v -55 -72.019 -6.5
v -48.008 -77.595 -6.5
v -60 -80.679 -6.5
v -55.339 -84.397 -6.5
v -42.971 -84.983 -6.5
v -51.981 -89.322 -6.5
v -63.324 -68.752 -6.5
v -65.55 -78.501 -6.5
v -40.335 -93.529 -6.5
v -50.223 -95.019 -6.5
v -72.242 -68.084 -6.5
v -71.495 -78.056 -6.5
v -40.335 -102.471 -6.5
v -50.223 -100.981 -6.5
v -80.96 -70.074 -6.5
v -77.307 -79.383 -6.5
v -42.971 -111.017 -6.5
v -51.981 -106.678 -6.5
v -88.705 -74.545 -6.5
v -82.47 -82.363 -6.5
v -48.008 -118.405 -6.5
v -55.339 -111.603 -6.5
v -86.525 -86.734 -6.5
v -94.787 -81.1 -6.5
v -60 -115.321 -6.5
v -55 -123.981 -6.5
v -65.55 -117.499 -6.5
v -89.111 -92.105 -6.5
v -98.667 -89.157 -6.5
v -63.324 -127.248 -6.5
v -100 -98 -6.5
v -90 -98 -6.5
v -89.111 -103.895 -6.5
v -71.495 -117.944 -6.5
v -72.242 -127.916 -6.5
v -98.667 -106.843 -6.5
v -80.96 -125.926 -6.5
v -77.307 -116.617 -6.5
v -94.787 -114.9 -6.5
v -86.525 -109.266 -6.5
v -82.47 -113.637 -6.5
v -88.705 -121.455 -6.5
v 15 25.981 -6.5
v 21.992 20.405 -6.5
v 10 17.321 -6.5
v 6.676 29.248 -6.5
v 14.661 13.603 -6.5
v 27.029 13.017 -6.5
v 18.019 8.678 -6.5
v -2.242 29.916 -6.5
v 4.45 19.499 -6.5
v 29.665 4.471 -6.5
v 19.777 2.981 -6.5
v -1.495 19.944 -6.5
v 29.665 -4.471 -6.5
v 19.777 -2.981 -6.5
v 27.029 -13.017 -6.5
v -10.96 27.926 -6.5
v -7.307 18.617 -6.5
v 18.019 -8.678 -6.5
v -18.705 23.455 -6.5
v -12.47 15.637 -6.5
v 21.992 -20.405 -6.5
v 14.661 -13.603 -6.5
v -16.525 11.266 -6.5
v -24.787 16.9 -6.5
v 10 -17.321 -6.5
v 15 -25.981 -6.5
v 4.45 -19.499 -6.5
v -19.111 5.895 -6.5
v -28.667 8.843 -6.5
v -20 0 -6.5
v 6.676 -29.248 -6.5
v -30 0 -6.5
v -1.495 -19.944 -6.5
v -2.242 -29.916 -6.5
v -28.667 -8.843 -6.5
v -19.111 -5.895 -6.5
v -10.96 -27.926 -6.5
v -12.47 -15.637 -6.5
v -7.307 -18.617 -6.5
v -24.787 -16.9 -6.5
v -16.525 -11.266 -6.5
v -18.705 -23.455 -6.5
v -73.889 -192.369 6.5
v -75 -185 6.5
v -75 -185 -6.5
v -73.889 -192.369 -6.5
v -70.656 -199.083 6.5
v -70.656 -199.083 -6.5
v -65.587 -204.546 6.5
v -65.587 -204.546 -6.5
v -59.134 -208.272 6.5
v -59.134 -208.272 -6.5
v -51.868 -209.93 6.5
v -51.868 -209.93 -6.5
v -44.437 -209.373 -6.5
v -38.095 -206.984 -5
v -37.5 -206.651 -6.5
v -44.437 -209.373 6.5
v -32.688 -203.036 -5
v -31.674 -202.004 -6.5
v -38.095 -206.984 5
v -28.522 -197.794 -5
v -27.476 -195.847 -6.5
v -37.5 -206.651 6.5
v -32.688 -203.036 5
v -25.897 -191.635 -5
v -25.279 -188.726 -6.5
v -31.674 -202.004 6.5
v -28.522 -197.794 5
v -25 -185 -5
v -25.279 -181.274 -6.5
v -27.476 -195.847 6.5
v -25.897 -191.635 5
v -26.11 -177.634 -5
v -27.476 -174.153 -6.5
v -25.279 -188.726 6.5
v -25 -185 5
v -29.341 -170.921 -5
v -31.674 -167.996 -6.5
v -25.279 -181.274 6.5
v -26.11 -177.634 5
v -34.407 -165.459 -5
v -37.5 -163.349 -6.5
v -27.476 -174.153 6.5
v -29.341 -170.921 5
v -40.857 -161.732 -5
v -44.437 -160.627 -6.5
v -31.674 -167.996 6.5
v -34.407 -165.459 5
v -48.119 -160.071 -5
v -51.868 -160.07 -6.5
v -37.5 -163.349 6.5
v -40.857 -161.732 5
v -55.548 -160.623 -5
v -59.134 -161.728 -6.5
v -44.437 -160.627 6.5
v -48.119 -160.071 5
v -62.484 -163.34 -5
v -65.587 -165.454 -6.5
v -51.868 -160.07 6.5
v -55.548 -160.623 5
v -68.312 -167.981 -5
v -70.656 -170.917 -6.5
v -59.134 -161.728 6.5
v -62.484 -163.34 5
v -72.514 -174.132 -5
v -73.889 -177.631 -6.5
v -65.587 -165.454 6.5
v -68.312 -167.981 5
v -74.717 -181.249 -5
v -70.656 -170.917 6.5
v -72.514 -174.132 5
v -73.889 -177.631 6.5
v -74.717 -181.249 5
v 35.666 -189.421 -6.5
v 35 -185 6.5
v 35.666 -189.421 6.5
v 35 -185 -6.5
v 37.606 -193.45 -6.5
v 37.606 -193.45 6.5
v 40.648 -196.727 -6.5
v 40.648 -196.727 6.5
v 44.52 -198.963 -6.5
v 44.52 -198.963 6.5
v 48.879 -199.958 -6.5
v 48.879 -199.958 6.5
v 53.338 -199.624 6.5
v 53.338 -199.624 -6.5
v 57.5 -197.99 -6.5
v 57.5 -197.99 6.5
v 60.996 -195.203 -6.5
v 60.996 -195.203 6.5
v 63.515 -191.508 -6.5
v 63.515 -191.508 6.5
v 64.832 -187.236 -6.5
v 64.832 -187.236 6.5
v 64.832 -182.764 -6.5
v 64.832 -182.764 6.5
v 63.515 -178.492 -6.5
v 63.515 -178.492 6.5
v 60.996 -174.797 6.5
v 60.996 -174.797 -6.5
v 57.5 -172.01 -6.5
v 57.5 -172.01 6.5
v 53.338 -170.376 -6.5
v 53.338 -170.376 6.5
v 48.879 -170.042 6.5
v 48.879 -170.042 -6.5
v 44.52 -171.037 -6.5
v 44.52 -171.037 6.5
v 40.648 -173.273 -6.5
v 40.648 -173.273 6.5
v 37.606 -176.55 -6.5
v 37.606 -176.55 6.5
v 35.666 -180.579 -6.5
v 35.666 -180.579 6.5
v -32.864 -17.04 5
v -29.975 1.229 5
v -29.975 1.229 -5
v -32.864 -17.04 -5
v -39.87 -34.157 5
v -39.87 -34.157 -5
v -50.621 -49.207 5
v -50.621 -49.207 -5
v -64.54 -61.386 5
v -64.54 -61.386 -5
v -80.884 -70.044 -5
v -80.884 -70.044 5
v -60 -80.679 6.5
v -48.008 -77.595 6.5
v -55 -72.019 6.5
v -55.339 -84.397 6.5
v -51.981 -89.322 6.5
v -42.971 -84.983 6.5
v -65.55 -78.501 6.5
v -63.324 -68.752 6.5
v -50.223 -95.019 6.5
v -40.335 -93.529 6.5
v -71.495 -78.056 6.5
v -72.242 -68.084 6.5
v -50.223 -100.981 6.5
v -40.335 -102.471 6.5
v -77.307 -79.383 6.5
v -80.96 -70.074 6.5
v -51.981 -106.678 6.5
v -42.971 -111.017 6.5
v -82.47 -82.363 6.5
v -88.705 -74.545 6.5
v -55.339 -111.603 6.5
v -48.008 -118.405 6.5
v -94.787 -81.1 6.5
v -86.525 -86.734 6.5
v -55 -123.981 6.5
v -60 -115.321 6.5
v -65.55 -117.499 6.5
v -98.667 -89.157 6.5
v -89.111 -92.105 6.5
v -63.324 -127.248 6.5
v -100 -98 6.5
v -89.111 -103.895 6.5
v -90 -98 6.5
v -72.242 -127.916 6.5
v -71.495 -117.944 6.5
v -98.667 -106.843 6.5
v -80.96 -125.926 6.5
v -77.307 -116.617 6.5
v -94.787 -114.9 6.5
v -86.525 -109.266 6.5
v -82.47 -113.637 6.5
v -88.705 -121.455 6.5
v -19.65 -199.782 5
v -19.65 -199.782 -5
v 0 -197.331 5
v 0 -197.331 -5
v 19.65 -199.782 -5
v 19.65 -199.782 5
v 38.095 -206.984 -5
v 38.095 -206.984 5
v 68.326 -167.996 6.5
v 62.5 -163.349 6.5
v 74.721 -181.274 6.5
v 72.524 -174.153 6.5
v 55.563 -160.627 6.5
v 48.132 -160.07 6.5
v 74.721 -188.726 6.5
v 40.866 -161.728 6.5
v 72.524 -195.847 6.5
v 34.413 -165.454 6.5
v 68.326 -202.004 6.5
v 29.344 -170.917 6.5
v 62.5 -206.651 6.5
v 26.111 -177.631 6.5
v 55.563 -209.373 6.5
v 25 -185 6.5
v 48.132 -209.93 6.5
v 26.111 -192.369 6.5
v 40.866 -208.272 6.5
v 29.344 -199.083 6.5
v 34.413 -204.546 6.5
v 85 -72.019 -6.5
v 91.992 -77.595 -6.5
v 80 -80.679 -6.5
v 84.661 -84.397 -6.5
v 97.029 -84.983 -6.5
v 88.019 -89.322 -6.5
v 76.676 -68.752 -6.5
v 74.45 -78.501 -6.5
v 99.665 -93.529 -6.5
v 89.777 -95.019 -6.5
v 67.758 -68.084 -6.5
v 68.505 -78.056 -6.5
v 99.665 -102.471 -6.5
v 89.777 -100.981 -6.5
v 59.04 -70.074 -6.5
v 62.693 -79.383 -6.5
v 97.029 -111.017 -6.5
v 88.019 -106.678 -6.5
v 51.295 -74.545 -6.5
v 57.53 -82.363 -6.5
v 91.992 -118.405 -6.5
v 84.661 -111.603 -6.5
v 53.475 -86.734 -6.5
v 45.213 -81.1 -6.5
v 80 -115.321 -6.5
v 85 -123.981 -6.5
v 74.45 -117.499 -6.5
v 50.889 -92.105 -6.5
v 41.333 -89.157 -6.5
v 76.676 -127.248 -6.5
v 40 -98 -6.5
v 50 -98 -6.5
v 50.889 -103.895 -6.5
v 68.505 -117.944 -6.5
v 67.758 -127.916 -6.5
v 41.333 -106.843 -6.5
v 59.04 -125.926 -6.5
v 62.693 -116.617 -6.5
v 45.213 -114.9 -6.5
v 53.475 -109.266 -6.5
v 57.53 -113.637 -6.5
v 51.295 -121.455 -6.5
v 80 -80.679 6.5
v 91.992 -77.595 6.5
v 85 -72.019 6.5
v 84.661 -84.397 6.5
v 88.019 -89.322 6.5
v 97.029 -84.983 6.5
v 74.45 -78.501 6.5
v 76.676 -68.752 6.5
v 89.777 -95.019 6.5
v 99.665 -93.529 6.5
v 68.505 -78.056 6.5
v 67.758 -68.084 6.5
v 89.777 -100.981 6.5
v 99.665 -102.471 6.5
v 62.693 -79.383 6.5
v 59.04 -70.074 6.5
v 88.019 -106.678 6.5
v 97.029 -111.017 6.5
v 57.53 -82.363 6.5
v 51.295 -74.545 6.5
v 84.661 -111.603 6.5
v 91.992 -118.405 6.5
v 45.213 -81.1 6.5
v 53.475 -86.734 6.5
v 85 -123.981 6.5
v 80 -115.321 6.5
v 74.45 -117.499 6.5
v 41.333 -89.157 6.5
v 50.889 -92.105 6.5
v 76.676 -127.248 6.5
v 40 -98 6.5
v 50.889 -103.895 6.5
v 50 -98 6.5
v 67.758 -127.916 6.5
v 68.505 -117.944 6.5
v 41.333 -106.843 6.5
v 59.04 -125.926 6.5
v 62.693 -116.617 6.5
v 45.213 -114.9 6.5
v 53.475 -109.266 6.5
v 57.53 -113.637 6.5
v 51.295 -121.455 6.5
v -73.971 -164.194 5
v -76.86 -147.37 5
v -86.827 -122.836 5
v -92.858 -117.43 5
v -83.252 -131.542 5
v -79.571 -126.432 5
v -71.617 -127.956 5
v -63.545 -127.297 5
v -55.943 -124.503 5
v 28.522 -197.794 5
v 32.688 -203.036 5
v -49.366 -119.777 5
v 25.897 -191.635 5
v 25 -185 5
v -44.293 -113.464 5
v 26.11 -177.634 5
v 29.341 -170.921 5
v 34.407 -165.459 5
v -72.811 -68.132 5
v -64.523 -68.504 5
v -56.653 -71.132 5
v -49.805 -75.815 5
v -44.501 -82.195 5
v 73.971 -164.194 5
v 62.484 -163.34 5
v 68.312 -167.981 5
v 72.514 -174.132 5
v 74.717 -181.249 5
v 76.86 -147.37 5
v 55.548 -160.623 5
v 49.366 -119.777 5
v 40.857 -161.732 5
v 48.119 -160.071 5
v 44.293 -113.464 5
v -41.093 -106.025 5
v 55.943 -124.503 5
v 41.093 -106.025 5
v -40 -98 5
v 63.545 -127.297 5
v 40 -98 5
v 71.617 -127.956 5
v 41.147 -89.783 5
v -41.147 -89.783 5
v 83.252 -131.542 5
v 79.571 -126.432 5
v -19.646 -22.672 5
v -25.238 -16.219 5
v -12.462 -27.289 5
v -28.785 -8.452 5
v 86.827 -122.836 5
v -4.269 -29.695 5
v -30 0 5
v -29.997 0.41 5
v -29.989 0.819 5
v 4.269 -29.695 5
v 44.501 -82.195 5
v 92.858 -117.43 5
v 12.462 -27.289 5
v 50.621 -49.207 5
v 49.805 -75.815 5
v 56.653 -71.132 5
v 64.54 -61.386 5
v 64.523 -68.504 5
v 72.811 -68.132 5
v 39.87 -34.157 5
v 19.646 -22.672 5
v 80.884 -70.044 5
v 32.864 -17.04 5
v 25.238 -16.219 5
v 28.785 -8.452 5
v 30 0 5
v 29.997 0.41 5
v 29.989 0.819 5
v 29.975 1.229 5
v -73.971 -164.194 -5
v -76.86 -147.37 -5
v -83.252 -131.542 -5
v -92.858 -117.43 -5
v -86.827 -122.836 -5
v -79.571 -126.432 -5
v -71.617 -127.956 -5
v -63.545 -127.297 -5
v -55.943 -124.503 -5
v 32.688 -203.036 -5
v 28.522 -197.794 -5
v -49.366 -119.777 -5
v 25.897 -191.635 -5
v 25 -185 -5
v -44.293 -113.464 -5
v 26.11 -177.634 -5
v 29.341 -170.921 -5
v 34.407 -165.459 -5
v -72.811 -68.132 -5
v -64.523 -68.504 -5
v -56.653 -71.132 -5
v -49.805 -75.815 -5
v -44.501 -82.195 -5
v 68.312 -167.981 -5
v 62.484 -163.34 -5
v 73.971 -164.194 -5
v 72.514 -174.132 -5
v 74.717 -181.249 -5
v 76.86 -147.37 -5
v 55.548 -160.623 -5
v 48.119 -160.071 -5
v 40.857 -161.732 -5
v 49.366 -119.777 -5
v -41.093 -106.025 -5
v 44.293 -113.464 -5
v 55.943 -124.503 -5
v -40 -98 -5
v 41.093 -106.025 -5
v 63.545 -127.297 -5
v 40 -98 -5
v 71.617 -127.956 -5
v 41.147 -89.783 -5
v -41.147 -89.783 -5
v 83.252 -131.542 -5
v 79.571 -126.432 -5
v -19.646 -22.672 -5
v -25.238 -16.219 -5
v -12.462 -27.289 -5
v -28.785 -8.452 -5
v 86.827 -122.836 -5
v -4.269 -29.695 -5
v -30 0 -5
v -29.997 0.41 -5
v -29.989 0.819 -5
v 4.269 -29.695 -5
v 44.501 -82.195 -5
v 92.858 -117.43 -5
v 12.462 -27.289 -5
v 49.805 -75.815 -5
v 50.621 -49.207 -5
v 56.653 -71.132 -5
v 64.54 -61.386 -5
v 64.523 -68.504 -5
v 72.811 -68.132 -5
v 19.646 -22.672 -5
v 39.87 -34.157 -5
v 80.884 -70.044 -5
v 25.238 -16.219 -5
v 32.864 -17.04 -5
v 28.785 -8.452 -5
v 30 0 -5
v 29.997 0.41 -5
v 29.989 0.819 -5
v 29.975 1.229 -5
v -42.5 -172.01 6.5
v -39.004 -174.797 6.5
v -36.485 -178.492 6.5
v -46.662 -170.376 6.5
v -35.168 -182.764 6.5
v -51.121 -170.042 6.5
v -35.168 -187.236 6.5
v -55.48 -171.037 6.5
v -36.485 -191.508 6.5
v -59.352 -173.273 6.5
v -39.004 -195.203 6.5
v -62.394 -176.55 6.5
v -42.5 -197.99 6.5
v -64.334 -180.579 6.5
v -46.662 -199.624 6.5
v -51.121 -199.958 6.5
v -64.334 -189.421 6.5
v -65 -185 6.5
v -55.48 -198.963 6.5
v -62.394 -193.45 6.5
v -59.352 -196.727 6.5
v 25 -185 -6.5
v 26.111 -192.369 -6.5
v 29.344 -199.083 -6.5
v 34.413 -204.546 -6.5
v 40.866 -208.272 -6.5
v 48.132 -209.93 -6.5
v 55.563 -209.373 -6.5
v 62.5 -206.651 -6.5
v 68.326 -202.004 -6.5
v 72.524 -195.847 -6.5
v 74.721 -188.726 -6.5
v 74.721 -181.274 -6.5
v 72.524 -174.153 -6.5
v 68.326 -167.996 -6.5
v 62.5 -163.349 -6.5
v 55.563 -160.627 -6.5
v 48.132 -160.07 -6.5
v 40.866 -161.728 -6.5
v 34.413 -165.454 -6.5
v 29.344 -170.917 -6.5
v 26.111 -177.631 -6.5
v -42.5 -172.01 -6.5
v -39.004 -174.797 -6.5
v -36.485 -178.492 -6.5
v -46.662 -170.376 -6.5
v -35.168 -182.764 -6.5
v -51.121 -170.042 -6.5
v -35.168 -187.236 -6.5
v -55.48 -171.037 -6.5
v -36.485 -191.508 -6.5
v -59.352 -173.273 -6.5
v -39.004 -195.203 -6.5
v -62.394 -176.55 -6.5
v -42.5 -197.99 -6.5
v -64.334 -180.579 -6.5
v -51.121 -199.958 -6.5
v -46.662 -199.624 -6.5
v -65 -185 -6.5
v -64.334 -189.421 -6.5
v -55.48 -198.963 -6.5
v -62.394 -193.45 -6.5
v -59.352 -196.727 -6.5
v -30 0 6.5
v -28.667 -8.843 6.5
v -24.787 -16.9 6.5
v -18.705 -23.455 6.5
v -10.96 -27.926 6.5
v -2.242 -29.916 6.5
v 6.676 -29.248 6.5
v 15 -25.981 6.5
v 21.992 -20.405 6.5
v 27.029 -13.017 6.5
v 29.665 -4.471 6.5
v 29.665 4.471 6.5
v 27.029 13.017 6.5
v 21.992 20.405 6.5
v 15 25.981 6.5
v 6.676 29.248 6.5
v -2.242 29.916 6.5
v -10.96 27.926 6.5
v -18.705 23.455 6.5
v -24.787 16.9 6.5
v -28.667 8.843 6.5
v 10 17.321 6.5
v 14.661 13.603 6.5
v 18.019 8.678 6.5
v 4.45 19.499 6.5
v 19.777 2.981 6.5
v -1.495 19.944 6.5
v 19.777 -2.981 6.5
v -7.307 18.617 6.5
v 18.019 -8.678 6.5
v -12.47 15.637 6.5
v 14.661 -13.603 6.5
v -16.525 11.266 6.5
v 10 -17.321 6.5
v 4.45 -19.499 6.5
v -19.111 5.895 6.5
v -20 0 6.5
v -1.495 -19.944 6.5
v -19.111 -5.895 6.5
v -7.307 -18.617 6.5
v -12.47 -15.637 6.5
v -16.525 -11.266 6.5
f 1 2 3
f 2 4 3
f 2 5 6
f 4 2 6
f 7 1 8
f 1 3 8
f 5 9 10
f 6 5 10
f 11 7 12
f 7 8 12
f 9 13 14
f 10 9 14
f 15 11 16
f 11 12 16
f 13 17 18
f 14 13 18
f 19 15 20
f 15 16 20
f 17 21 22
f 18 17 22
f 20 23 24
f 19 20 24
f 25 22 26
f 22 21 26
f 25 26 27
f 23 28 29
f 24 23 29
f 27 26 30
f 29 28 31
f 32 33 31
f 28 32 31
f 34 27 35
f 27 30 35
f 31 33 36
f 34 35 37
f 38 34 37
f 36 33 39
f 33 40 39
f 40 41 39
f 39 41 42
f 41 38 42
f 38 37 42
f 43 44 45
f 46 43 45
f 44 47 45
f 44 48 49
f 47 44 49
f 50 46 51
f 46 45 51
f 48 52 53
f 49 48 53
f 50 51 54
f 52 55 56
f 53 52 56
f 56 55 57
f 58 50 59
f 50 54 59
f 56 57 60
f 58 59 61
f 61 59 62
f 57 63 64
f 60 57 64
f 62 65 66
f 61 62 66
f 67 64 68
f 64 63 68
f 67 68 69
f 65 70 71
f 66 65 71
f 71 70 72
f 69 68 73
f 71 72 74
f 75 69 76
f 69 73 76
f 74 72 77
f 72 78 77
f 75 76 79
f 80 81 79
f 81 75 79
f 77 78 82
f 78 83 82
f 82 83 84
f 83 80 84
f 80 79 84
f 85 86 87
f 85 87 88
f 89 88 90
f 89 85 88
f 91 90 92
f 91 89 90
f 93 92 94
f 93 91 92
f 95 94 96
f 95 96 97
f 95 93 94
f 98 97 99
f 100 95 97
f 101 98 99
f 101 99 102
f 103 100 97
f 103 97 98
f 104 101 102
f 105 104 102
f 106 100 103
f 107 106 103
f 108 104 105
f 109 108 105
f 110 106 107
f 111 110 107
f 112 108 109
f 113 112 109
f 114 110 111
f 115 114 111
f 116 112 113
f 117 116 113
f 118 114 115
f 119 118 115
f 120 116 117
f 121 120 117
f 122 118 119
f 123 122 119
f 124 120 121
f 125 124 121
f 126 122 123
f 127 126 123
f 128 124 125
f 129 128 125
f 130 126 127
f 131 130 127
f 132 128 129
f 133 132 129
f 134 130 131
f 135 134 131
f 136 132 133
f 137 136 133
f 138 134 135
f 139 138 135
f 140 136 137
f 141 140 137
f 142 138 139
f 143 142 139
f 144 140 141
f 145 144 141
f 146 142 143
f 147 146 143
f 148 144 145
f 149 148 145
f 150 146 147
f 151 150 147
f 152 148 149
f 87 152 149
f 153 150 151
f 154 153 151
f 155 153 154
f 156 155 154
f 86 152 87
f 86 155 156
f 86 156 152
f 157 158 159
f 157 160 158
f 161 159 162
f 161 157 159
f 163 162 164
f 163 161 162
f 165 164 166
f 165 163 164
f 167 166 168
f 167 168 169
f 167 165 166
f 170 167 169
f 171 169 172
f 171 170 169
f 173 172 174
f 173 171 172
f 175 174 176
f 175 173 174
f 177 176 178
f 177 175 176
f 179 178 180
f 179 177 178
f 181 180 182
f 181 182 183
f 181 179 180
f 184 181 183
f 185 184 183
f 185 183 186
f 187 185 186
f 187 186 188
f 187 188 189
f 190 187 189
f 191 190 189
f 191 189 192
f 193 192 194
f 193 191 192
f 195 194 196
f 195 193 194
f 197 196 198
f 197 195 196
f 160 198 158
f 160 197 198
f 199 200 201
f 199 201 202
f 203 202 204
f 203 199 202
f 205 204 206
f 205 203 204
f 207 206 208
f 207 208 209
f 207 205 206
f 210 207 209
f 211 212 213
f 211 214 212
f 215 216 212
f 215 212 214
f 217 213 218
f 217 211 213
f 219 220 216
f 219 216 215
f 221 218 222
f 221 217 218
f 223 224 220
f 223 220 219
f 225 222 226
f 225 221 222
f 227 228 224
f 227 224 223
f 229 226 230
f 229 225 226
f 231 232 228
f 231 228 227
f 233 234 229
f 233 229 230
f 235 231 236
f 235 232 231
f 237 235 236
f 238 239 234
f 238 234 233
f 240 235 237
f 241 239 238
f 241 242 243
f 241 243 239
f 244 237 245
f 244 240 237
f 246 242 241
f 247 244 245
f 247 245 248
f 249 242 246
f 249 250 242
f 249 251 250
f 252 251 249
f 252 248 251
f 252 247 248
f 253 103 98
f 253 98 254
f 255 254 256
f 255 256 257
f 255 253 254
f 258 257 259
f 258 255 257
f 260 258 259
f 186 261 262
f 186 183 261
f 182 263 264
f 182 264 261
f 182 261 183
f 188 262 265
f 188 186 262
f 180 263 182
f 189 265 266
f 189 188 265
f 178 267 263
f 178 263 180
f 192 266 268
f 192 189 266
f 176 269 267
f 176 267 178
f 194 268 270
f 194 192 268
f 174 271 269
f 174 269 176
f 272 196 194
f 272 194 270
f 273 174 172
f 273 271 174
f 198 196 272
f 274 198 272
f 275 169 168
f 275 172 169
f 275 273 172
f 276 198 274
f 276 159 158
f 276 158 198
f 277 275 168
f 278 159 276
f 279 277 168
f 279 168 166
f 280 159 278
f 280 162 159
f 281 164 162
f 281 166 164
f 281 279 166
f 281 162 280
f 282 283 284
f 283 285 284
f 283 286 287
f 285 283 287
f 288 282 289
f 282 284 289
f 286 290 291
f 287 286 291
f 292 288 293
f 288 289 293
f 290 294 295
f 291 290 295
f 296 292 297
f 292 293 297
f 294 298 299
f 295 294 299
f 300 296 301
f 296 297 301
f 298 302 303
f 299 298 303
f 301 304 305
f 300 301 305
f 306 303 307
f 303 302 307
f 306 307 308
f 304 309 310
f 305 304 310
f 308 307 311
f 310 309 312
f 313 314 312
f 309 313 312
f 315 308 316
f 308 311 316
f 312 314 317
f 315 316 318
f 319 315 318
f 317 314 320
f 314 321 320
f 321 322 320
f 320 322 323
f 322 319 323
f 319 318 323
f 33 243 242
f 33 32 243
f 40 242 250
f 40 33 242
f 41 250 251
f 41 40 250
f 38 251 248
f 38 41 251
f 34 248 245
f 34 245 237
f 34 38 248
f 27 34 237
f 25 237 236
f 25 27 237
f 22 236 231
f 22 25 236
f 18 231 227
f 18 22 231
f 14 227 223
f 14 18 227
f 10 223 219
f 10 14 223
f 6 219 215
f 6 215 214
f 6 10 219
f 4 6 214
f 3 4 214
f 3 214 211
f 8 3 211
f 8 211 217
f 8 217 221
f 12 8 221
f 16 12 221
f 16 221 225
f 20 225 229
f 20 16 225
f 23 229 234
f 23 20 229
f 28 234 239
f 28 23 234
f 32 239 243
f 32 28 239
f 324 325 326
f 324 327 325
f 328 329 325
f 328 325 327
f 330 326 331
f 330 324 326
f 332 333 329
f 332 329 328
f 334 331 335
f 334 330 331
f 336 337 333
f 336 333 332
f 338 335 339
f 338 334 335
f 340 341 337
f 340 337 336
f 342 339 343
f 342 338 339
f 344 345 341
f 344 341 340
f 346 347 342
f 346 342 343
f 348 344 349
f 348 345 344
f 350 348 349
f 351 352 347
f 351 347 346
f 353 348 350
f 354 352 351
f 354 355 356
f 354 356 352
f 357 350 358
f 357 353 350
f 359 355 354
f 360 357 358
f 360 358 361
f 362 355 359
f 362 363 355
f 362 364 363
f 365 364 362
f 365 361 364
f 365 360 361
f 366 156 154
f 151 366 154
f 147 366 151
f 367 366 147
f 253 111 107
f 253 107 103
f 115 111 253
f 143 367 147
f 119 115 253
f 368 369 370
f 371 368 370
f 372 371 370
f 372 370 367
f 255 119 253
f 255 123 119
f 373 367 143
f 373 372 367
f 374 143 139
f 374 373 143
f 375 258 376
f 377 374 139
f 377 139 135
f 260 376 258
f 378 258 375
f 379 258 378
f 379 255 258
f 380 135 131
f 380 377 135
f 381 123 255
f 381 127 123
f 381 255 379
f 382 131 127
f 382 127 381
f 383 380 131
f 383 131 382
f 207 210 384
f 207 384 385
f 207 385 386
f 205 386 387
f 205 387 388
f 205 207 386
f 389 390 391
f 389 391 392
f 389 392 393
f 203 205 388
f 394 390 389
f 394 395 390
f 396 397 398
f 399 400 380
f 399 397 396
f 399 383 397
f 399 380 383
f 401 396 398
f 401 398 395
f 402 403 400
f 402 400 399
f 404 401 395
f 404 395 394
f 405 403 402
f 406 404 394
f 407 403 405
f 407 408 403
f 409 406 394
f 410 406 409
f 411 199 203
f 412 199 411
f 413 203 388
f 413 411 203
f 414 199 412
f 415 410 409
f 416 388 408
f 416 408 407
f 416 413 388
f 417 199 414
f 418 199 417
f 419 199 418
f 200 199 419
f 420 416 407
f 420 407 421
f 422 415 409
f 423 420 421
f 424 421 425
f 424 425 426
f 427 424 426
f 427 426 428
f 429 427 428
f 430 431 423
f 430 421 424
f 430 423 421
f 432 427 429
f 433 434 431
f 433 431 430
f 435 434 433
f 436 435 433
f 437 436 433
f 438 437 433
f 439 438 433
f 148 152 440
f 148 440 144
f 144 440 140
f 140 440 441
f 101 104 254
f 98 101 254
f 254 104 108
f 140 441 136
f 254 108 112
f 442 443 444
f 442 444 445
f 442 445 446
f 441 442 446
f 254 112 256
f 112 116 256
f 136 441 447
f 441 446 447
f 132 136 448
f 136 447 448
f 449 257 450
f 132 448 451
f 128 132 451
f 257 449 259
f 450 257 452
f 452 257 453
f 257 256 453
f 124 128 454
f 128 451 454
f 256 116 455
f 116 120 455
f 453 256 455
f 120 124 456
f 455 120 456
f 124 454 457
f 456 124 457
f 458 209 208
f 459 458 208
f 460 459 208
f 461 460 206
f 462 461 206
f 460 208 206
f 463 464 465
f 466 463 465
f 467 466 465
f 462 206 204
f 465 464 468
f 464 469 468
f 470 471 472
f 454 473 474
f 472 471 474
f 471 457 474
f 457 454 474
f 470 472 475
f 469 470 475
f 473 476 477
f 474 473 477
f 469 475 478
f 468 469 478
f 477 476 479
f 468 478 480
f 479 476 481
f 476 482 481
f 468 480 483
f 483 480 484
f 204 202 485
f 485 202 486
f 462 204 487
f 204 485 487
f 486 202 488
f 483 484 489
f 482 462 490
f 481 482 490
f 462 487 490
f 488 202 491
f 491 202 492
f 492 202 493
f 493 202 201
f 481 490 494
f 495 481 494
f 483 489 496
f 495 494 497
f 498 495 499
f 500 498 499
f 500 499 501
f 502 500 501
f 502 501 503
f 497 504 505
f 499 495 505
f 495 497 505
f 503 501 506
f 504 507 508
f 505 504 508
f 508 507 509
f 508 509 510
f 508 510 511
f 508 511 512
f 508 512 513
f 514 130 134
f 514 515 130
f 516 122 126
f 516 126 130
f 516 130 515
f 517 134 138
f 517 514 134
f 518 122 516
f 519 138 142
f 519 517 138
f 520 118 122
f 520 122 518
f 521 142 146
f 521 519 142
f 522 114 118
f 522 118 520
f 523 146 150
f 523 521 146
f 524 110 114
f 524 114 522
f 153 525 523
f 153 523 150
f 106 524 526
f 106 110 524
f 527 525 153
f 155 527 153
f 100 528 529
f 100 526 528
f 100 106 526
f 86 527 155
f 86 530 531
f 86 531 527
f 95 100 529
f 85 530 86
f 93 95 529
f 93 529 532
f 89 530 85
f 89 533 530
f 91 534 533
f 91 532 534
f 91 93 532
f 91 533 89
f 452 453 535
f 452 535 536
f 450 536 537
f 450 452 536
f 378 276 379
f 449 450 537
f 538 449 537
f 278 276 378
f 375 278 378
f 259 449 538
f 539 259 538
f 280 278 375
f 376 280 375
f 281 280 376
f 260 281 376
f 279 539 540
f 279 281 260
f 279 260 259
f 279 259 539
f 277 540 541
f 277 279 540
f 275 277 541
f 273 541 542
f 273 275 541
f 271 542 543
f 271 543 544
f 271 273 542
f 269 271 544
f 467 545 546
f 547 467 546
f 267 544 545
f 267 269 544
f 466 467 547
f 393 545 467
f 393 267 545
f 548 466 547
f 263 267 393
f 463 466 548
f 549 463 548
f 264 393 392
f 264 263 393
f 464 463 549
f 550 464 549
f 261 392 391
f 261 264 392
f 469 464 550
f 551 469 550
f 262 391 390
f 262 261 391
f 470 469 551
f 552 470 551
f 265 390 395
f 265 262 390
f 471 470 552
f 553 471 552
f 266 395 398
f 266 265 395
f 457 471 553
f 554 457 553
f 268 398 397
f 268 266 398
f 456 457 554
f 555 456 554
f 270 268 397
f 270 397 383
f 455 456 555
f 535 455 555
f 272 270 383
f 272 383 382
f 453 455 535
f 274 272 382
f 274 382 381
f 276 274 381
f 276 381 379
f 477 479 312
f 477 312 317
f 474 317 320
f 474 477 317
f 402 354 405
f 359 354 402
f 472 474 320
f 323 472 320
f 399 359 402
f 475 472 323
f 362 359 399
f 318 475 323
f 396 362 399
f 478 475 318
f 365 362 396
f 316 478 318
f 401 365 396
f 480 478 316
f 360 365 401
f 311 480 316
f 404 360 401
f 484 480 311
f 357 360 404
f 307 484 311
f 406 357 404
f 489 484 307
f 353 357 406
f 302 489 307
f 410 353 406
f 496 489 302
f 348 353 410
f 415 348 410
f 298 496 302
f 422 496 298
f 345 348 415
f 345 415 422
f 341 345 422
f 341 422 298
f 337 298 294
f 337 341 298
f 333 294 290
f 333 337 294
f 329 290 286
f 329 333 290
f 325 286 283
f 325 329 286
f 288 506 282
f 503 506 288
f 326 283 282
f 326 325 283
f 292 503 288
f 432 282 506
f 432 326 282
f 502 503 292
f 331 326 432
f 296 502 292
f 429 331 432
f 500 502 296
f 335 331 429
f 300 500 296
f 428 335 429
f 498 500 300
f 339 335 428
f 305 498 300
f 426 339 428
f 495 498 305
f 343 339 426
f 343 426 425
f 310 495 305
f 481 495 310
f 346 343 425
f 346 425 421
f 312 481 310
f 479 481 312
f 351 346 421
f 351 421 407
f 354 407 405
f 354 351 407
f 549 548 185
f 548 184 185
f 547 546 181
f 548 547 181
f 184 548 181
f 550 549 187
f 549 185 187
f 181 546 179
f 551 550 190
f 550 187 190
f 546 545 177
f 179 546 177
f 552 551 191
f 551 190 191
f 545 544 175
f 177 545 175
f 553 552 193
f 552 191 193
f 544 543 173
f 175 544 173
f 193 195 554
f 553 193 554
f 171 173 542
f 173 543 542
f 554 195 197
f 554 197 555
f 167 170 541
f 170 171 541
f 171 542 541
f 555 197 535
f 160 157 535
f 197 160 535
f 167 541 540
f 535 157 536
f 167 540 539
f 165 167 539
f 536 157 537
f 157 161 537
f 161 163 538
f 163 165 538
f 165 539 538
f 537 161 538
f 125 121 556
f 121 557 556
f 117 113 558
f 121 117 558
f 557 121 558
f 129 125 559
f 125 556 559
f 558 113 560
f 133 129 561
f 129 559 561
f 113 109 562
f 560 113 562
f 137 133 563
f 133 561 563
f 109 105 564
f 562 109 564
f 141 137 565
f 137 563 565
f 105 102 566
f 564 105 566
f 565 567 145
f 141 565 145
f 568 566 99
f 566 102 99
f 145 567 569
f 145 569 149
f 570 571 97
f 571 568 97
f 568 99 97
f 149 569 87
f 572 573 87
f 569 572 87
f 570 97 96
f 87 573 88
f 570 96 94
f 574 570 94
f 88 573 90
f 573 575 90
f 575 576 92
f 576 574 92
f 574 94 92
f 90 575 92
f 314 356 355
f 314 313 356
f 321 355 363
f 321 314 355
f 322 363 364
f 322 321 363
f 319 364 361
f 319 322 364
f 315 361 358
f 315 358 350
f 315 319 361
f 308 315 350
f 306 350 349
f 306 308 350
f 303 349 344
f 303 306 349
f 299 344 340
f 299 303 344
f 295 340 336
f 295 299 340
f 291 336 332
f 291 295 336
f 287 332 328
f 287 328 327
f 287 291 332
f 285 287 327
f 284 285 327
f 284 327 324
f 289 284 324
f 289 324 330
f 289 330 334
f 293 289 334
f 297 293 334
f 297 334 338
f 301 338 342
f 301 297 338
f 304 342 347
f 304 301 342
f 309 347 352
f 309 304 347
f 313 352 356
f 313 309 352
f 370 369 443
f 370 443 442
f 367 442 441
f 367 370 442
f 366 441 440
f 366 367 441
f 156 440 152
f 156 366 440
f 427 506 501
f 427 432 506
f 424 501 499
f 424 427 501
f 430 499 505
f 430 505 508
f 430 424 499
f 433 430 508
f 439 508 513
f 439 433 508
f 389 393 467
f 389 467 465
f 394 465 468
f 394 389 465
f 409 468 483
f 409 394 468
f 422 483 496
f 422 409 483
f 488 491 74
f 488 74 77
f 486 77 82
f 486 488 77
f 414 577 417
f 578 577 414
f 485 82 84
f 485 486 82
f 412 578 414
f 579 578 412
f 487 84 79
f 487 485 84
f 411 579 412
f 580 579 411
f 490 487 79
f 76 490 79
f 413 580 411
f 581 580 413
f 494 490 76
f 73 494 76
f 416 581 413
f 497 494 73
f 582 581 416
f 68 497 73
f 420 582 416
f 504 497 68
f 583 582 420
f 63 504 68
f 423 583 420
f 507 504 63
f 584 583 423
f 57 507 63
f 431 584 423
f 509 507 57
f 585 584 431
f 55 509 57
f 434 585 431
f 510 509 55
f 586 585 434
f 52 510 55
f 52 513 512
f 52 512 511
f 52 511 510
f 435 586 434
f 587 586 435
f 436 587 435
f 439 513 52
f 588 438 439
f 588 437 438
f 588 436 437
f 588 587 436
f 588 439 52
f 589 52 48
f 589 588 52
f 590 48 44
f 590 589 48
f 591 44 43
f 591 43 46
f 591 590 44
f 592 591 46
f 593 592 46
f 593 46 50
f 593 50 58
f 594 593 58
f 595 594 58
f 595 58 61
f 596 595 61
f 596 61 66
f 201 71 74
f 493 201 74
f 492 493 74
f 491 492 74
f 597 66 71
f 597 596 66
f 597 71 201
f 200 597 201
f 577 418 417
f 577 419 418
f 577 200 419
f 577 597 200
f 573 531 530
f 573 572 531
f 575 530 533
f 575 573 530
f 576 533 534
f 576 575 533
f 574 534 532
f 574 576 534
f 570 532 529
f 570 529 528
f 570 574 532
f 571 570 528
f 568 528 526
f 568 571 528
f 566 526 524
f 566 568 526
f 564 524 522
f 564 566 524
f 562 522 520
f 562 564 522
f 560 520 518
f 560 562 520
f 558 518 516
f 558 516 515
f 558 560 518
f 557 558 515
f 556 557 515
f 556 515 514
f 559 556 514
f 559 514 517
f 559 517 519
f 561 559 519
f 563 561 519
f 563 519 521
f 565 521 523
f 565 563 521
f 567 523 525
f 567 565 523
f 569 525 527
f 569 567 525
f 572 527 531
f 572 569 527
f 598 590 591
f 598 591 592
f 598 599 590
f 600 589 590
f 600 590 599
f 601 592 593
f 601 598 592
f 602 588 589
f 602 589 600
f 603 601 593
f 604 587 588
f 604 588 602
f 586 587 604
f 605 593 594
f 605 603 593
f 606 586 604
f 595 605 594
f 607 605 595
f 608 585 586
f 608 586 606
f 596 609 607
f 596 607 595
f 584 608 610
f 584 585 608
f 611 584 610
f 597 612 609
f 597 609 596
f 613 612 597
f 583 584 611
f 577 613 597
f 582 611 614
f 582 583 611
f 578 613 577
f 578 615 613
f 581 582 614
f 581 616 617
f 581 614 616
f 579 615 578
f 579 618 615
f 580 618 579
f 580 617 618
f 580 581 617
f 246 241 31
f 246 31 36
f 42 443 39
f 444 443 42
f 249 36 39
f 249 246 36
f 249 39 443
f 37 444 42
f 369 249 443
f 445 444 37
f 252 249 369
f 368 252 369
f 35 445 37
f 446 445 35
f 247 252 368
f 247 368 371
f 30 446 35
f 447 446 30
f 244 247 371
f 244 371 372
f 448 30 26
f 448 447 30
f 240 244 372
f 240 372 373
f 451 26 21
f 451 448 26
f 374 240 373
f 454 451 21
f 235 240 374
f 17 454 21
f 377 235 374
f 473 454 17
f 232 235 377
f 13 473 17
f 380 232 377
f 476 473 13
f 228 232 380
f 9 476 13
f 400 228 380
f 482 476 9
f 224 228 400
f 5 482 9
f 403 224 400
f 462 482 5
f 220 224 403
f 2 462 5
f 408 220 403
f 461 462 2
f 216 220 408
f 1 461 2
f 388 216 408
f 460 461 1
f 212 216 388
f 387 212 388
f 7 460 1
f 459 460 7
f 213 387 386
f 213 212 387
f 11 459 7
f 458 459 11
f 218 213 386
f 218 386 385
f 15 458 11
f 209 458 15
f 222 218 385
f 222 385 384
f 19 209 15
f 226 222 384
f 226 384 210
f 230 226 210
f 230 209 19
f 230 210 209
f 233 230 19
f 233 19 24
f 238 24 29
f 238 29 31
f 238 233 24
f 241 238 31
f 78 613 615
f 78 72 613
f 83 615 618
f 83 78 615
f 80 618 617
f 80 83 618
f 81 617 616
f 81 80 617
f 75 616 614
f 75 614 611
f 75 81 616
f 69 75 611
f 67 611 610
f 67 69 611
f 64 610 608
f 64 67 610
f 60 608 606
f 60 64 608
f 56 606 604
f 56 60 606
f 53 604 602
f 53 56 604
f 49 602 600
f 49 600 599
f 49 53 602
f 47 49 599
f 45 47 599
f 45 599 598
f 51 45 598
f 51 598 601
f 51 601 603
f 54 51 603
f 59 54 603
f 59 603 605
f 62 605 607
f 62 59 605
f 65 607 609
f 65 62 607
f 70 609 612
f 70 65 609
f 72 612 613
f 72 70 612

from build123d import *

# Parameters (mm, degrees)
SKETCH1_R             = 30
SKETCH1_R_2           = 20
BOSS_EXTRUDE1_DEPTH   = 6.5
BOSS_EXTRUDE1_2_DEPTH = 6.5
BOSS_EXTRUDE1_3_DEPTH = 6.5
SKETCH1_R_3           = 25
SKETCH1_R_4           = 15
BOSS_EXTRUDE1_4_DEPTH = 6.5
BOSS_EXTRUDE1_5_DEPTH = 6.5
BOSS_EXTRUDE2_DEPTH   = 5


with BuildPart() as part:
    # Sketch1 → Boss-Extrude1 (new, symmetric)
    with BuildSketch(Plane.XY):
        Circle(SKETCH1_R)
        Circle(SKETCH1_R_2, mode=Mode.SUBTRACT)
    extrude(amount=BOSS_EXTRUDE1_DEPTH, both=True)



with BuildPart() as body_2:
    # Sketch1 → Boss-Extrude1 2 (new, symmetric)
    with BuildSketch(Plane.XY):
        with Locations((70, -98)):
            Circle(SKETCH1_R)
        with Locations((70, -98)):
            Circle(SKETCH1_R_2, mode=Mode.SUBTRACT)
    extrude(amount=BOSS_EXTRUDE1_2_DEPTH, both=True)


with BuildPart() as body_3:
    # Sketch1 → Boss-Extrude1 3 (new, symmetric)
    with BuildSketch(Plane.XY):
        with Locations((-70, -98)):
            Circle(SKETCH1_R)
        with Locations((-70, -98)):
            Circle(SKETCH1_R_2, mode=Mode.SUBTRACT)
    extrude(amount=BOSS_EXTRUDE1_3_DEPTH, both=True)


with BuildPart() as body_4:
    # Sketch1 → Boss-Extrude1 4 (new, symmetric)
    with BuildSketch(Plane.XY):
        with Locations((50, -185)):
            Circle(SKETCH1_R_3)
        with Locations((50, -185)):
            Circle(SKETCH1_R_4, mode=Mode.SUBTRACT)
    extrude(amount=BOSS_EXTRUDE1_4_DEPTH, both=True)


with BuildPart() as body_5:
    # Sketch1 → Boss-Extrude1 5 (new, symmetric)
    with BuildSketch(Plane.XY):
        with Locations((-50, -185)):
            Circle(SKETCH1_R_3)
        with Locations((-50, -185)):
            Circle(SKETCH1_R_4, mode=Mode.SUBTRACT)
    extrude(amount=BOSS_EXTRUDE1_5_DEPTH, both=True)


with BuildPart() as part_1:
    add(part.part)

    add(body_2.part)  # Boss-Extrude2 merges body 2

    add(body_3.part)  # Boss-Extrude2 merges body 3

    add(body_4.part)  # Boss-Extrude2 merges body 4

    add(body_5.part)  # Boss-Extrude2 merges body 5
    # Sketch1<3> → Boss-Extrude2 (add, symmetric)
    with BuildSketch(Plane.XY):
        with BuildLine():
            ThreePointArc((29.974824802, 1.228770963), (29.99370554, 0.614514416), (30, 0))
            ThreePointArc((30, 0), (-0.614514416, -29.99370554), (-29.974824802, 1.228770963))
            ThreePointArc((-29.974824802, 1.228770963), (-44.809013245, -41.993561968), (-80.883915711, -70.04395631))
            ThreePointArc((-80.883915711, -70.04395631), (-53.066563718, -73.235938627), (-40, -98))
            ThreePointArc((-40, -98), (-59.649329868, -126.157834217), (-92.857575187, -117.430163575))
            ThreePointArc((-92.857575187, -117.430163575), (-76.859583983, -147.370140698), (-74.716930719, -181.248555502))
            ThreePointArc((-74.716930719, -181.248555502), (-48.118945506, -160.070867765), (-25, -185))
            ThreePointArc((-25, -185), (-28.521882675, -197.794157893), (-38.095238095, -206.983553944))
            ThreePointArc((-38.095238095, -206.983553944), (0, -197.330926563), (38.095238095, -206.983553944))
            ThreePointArc((38.095238095, -206.983553944), (35.626049477, -164.54542725), (74.716930719, -181.248555502))
            ThreePointArc((74.716930719, -181.248555502), (76.859583983, -147.370140698), (92.857575187, -117.430163575))
            ThreePointArc((92.857575187, -117.430163575), (40.914175072, -105.349475372), (80.883915711, -70.04395631))
            ThreePointArc((80.883915711, -70.04395631), (44.809013245, -41.993561968), (29.974824802, 1.228770963))
        make_face()
    extrude(amount=BOSS_EXTRUDE2_DEPTH, both=True)


solid = part_1.part
